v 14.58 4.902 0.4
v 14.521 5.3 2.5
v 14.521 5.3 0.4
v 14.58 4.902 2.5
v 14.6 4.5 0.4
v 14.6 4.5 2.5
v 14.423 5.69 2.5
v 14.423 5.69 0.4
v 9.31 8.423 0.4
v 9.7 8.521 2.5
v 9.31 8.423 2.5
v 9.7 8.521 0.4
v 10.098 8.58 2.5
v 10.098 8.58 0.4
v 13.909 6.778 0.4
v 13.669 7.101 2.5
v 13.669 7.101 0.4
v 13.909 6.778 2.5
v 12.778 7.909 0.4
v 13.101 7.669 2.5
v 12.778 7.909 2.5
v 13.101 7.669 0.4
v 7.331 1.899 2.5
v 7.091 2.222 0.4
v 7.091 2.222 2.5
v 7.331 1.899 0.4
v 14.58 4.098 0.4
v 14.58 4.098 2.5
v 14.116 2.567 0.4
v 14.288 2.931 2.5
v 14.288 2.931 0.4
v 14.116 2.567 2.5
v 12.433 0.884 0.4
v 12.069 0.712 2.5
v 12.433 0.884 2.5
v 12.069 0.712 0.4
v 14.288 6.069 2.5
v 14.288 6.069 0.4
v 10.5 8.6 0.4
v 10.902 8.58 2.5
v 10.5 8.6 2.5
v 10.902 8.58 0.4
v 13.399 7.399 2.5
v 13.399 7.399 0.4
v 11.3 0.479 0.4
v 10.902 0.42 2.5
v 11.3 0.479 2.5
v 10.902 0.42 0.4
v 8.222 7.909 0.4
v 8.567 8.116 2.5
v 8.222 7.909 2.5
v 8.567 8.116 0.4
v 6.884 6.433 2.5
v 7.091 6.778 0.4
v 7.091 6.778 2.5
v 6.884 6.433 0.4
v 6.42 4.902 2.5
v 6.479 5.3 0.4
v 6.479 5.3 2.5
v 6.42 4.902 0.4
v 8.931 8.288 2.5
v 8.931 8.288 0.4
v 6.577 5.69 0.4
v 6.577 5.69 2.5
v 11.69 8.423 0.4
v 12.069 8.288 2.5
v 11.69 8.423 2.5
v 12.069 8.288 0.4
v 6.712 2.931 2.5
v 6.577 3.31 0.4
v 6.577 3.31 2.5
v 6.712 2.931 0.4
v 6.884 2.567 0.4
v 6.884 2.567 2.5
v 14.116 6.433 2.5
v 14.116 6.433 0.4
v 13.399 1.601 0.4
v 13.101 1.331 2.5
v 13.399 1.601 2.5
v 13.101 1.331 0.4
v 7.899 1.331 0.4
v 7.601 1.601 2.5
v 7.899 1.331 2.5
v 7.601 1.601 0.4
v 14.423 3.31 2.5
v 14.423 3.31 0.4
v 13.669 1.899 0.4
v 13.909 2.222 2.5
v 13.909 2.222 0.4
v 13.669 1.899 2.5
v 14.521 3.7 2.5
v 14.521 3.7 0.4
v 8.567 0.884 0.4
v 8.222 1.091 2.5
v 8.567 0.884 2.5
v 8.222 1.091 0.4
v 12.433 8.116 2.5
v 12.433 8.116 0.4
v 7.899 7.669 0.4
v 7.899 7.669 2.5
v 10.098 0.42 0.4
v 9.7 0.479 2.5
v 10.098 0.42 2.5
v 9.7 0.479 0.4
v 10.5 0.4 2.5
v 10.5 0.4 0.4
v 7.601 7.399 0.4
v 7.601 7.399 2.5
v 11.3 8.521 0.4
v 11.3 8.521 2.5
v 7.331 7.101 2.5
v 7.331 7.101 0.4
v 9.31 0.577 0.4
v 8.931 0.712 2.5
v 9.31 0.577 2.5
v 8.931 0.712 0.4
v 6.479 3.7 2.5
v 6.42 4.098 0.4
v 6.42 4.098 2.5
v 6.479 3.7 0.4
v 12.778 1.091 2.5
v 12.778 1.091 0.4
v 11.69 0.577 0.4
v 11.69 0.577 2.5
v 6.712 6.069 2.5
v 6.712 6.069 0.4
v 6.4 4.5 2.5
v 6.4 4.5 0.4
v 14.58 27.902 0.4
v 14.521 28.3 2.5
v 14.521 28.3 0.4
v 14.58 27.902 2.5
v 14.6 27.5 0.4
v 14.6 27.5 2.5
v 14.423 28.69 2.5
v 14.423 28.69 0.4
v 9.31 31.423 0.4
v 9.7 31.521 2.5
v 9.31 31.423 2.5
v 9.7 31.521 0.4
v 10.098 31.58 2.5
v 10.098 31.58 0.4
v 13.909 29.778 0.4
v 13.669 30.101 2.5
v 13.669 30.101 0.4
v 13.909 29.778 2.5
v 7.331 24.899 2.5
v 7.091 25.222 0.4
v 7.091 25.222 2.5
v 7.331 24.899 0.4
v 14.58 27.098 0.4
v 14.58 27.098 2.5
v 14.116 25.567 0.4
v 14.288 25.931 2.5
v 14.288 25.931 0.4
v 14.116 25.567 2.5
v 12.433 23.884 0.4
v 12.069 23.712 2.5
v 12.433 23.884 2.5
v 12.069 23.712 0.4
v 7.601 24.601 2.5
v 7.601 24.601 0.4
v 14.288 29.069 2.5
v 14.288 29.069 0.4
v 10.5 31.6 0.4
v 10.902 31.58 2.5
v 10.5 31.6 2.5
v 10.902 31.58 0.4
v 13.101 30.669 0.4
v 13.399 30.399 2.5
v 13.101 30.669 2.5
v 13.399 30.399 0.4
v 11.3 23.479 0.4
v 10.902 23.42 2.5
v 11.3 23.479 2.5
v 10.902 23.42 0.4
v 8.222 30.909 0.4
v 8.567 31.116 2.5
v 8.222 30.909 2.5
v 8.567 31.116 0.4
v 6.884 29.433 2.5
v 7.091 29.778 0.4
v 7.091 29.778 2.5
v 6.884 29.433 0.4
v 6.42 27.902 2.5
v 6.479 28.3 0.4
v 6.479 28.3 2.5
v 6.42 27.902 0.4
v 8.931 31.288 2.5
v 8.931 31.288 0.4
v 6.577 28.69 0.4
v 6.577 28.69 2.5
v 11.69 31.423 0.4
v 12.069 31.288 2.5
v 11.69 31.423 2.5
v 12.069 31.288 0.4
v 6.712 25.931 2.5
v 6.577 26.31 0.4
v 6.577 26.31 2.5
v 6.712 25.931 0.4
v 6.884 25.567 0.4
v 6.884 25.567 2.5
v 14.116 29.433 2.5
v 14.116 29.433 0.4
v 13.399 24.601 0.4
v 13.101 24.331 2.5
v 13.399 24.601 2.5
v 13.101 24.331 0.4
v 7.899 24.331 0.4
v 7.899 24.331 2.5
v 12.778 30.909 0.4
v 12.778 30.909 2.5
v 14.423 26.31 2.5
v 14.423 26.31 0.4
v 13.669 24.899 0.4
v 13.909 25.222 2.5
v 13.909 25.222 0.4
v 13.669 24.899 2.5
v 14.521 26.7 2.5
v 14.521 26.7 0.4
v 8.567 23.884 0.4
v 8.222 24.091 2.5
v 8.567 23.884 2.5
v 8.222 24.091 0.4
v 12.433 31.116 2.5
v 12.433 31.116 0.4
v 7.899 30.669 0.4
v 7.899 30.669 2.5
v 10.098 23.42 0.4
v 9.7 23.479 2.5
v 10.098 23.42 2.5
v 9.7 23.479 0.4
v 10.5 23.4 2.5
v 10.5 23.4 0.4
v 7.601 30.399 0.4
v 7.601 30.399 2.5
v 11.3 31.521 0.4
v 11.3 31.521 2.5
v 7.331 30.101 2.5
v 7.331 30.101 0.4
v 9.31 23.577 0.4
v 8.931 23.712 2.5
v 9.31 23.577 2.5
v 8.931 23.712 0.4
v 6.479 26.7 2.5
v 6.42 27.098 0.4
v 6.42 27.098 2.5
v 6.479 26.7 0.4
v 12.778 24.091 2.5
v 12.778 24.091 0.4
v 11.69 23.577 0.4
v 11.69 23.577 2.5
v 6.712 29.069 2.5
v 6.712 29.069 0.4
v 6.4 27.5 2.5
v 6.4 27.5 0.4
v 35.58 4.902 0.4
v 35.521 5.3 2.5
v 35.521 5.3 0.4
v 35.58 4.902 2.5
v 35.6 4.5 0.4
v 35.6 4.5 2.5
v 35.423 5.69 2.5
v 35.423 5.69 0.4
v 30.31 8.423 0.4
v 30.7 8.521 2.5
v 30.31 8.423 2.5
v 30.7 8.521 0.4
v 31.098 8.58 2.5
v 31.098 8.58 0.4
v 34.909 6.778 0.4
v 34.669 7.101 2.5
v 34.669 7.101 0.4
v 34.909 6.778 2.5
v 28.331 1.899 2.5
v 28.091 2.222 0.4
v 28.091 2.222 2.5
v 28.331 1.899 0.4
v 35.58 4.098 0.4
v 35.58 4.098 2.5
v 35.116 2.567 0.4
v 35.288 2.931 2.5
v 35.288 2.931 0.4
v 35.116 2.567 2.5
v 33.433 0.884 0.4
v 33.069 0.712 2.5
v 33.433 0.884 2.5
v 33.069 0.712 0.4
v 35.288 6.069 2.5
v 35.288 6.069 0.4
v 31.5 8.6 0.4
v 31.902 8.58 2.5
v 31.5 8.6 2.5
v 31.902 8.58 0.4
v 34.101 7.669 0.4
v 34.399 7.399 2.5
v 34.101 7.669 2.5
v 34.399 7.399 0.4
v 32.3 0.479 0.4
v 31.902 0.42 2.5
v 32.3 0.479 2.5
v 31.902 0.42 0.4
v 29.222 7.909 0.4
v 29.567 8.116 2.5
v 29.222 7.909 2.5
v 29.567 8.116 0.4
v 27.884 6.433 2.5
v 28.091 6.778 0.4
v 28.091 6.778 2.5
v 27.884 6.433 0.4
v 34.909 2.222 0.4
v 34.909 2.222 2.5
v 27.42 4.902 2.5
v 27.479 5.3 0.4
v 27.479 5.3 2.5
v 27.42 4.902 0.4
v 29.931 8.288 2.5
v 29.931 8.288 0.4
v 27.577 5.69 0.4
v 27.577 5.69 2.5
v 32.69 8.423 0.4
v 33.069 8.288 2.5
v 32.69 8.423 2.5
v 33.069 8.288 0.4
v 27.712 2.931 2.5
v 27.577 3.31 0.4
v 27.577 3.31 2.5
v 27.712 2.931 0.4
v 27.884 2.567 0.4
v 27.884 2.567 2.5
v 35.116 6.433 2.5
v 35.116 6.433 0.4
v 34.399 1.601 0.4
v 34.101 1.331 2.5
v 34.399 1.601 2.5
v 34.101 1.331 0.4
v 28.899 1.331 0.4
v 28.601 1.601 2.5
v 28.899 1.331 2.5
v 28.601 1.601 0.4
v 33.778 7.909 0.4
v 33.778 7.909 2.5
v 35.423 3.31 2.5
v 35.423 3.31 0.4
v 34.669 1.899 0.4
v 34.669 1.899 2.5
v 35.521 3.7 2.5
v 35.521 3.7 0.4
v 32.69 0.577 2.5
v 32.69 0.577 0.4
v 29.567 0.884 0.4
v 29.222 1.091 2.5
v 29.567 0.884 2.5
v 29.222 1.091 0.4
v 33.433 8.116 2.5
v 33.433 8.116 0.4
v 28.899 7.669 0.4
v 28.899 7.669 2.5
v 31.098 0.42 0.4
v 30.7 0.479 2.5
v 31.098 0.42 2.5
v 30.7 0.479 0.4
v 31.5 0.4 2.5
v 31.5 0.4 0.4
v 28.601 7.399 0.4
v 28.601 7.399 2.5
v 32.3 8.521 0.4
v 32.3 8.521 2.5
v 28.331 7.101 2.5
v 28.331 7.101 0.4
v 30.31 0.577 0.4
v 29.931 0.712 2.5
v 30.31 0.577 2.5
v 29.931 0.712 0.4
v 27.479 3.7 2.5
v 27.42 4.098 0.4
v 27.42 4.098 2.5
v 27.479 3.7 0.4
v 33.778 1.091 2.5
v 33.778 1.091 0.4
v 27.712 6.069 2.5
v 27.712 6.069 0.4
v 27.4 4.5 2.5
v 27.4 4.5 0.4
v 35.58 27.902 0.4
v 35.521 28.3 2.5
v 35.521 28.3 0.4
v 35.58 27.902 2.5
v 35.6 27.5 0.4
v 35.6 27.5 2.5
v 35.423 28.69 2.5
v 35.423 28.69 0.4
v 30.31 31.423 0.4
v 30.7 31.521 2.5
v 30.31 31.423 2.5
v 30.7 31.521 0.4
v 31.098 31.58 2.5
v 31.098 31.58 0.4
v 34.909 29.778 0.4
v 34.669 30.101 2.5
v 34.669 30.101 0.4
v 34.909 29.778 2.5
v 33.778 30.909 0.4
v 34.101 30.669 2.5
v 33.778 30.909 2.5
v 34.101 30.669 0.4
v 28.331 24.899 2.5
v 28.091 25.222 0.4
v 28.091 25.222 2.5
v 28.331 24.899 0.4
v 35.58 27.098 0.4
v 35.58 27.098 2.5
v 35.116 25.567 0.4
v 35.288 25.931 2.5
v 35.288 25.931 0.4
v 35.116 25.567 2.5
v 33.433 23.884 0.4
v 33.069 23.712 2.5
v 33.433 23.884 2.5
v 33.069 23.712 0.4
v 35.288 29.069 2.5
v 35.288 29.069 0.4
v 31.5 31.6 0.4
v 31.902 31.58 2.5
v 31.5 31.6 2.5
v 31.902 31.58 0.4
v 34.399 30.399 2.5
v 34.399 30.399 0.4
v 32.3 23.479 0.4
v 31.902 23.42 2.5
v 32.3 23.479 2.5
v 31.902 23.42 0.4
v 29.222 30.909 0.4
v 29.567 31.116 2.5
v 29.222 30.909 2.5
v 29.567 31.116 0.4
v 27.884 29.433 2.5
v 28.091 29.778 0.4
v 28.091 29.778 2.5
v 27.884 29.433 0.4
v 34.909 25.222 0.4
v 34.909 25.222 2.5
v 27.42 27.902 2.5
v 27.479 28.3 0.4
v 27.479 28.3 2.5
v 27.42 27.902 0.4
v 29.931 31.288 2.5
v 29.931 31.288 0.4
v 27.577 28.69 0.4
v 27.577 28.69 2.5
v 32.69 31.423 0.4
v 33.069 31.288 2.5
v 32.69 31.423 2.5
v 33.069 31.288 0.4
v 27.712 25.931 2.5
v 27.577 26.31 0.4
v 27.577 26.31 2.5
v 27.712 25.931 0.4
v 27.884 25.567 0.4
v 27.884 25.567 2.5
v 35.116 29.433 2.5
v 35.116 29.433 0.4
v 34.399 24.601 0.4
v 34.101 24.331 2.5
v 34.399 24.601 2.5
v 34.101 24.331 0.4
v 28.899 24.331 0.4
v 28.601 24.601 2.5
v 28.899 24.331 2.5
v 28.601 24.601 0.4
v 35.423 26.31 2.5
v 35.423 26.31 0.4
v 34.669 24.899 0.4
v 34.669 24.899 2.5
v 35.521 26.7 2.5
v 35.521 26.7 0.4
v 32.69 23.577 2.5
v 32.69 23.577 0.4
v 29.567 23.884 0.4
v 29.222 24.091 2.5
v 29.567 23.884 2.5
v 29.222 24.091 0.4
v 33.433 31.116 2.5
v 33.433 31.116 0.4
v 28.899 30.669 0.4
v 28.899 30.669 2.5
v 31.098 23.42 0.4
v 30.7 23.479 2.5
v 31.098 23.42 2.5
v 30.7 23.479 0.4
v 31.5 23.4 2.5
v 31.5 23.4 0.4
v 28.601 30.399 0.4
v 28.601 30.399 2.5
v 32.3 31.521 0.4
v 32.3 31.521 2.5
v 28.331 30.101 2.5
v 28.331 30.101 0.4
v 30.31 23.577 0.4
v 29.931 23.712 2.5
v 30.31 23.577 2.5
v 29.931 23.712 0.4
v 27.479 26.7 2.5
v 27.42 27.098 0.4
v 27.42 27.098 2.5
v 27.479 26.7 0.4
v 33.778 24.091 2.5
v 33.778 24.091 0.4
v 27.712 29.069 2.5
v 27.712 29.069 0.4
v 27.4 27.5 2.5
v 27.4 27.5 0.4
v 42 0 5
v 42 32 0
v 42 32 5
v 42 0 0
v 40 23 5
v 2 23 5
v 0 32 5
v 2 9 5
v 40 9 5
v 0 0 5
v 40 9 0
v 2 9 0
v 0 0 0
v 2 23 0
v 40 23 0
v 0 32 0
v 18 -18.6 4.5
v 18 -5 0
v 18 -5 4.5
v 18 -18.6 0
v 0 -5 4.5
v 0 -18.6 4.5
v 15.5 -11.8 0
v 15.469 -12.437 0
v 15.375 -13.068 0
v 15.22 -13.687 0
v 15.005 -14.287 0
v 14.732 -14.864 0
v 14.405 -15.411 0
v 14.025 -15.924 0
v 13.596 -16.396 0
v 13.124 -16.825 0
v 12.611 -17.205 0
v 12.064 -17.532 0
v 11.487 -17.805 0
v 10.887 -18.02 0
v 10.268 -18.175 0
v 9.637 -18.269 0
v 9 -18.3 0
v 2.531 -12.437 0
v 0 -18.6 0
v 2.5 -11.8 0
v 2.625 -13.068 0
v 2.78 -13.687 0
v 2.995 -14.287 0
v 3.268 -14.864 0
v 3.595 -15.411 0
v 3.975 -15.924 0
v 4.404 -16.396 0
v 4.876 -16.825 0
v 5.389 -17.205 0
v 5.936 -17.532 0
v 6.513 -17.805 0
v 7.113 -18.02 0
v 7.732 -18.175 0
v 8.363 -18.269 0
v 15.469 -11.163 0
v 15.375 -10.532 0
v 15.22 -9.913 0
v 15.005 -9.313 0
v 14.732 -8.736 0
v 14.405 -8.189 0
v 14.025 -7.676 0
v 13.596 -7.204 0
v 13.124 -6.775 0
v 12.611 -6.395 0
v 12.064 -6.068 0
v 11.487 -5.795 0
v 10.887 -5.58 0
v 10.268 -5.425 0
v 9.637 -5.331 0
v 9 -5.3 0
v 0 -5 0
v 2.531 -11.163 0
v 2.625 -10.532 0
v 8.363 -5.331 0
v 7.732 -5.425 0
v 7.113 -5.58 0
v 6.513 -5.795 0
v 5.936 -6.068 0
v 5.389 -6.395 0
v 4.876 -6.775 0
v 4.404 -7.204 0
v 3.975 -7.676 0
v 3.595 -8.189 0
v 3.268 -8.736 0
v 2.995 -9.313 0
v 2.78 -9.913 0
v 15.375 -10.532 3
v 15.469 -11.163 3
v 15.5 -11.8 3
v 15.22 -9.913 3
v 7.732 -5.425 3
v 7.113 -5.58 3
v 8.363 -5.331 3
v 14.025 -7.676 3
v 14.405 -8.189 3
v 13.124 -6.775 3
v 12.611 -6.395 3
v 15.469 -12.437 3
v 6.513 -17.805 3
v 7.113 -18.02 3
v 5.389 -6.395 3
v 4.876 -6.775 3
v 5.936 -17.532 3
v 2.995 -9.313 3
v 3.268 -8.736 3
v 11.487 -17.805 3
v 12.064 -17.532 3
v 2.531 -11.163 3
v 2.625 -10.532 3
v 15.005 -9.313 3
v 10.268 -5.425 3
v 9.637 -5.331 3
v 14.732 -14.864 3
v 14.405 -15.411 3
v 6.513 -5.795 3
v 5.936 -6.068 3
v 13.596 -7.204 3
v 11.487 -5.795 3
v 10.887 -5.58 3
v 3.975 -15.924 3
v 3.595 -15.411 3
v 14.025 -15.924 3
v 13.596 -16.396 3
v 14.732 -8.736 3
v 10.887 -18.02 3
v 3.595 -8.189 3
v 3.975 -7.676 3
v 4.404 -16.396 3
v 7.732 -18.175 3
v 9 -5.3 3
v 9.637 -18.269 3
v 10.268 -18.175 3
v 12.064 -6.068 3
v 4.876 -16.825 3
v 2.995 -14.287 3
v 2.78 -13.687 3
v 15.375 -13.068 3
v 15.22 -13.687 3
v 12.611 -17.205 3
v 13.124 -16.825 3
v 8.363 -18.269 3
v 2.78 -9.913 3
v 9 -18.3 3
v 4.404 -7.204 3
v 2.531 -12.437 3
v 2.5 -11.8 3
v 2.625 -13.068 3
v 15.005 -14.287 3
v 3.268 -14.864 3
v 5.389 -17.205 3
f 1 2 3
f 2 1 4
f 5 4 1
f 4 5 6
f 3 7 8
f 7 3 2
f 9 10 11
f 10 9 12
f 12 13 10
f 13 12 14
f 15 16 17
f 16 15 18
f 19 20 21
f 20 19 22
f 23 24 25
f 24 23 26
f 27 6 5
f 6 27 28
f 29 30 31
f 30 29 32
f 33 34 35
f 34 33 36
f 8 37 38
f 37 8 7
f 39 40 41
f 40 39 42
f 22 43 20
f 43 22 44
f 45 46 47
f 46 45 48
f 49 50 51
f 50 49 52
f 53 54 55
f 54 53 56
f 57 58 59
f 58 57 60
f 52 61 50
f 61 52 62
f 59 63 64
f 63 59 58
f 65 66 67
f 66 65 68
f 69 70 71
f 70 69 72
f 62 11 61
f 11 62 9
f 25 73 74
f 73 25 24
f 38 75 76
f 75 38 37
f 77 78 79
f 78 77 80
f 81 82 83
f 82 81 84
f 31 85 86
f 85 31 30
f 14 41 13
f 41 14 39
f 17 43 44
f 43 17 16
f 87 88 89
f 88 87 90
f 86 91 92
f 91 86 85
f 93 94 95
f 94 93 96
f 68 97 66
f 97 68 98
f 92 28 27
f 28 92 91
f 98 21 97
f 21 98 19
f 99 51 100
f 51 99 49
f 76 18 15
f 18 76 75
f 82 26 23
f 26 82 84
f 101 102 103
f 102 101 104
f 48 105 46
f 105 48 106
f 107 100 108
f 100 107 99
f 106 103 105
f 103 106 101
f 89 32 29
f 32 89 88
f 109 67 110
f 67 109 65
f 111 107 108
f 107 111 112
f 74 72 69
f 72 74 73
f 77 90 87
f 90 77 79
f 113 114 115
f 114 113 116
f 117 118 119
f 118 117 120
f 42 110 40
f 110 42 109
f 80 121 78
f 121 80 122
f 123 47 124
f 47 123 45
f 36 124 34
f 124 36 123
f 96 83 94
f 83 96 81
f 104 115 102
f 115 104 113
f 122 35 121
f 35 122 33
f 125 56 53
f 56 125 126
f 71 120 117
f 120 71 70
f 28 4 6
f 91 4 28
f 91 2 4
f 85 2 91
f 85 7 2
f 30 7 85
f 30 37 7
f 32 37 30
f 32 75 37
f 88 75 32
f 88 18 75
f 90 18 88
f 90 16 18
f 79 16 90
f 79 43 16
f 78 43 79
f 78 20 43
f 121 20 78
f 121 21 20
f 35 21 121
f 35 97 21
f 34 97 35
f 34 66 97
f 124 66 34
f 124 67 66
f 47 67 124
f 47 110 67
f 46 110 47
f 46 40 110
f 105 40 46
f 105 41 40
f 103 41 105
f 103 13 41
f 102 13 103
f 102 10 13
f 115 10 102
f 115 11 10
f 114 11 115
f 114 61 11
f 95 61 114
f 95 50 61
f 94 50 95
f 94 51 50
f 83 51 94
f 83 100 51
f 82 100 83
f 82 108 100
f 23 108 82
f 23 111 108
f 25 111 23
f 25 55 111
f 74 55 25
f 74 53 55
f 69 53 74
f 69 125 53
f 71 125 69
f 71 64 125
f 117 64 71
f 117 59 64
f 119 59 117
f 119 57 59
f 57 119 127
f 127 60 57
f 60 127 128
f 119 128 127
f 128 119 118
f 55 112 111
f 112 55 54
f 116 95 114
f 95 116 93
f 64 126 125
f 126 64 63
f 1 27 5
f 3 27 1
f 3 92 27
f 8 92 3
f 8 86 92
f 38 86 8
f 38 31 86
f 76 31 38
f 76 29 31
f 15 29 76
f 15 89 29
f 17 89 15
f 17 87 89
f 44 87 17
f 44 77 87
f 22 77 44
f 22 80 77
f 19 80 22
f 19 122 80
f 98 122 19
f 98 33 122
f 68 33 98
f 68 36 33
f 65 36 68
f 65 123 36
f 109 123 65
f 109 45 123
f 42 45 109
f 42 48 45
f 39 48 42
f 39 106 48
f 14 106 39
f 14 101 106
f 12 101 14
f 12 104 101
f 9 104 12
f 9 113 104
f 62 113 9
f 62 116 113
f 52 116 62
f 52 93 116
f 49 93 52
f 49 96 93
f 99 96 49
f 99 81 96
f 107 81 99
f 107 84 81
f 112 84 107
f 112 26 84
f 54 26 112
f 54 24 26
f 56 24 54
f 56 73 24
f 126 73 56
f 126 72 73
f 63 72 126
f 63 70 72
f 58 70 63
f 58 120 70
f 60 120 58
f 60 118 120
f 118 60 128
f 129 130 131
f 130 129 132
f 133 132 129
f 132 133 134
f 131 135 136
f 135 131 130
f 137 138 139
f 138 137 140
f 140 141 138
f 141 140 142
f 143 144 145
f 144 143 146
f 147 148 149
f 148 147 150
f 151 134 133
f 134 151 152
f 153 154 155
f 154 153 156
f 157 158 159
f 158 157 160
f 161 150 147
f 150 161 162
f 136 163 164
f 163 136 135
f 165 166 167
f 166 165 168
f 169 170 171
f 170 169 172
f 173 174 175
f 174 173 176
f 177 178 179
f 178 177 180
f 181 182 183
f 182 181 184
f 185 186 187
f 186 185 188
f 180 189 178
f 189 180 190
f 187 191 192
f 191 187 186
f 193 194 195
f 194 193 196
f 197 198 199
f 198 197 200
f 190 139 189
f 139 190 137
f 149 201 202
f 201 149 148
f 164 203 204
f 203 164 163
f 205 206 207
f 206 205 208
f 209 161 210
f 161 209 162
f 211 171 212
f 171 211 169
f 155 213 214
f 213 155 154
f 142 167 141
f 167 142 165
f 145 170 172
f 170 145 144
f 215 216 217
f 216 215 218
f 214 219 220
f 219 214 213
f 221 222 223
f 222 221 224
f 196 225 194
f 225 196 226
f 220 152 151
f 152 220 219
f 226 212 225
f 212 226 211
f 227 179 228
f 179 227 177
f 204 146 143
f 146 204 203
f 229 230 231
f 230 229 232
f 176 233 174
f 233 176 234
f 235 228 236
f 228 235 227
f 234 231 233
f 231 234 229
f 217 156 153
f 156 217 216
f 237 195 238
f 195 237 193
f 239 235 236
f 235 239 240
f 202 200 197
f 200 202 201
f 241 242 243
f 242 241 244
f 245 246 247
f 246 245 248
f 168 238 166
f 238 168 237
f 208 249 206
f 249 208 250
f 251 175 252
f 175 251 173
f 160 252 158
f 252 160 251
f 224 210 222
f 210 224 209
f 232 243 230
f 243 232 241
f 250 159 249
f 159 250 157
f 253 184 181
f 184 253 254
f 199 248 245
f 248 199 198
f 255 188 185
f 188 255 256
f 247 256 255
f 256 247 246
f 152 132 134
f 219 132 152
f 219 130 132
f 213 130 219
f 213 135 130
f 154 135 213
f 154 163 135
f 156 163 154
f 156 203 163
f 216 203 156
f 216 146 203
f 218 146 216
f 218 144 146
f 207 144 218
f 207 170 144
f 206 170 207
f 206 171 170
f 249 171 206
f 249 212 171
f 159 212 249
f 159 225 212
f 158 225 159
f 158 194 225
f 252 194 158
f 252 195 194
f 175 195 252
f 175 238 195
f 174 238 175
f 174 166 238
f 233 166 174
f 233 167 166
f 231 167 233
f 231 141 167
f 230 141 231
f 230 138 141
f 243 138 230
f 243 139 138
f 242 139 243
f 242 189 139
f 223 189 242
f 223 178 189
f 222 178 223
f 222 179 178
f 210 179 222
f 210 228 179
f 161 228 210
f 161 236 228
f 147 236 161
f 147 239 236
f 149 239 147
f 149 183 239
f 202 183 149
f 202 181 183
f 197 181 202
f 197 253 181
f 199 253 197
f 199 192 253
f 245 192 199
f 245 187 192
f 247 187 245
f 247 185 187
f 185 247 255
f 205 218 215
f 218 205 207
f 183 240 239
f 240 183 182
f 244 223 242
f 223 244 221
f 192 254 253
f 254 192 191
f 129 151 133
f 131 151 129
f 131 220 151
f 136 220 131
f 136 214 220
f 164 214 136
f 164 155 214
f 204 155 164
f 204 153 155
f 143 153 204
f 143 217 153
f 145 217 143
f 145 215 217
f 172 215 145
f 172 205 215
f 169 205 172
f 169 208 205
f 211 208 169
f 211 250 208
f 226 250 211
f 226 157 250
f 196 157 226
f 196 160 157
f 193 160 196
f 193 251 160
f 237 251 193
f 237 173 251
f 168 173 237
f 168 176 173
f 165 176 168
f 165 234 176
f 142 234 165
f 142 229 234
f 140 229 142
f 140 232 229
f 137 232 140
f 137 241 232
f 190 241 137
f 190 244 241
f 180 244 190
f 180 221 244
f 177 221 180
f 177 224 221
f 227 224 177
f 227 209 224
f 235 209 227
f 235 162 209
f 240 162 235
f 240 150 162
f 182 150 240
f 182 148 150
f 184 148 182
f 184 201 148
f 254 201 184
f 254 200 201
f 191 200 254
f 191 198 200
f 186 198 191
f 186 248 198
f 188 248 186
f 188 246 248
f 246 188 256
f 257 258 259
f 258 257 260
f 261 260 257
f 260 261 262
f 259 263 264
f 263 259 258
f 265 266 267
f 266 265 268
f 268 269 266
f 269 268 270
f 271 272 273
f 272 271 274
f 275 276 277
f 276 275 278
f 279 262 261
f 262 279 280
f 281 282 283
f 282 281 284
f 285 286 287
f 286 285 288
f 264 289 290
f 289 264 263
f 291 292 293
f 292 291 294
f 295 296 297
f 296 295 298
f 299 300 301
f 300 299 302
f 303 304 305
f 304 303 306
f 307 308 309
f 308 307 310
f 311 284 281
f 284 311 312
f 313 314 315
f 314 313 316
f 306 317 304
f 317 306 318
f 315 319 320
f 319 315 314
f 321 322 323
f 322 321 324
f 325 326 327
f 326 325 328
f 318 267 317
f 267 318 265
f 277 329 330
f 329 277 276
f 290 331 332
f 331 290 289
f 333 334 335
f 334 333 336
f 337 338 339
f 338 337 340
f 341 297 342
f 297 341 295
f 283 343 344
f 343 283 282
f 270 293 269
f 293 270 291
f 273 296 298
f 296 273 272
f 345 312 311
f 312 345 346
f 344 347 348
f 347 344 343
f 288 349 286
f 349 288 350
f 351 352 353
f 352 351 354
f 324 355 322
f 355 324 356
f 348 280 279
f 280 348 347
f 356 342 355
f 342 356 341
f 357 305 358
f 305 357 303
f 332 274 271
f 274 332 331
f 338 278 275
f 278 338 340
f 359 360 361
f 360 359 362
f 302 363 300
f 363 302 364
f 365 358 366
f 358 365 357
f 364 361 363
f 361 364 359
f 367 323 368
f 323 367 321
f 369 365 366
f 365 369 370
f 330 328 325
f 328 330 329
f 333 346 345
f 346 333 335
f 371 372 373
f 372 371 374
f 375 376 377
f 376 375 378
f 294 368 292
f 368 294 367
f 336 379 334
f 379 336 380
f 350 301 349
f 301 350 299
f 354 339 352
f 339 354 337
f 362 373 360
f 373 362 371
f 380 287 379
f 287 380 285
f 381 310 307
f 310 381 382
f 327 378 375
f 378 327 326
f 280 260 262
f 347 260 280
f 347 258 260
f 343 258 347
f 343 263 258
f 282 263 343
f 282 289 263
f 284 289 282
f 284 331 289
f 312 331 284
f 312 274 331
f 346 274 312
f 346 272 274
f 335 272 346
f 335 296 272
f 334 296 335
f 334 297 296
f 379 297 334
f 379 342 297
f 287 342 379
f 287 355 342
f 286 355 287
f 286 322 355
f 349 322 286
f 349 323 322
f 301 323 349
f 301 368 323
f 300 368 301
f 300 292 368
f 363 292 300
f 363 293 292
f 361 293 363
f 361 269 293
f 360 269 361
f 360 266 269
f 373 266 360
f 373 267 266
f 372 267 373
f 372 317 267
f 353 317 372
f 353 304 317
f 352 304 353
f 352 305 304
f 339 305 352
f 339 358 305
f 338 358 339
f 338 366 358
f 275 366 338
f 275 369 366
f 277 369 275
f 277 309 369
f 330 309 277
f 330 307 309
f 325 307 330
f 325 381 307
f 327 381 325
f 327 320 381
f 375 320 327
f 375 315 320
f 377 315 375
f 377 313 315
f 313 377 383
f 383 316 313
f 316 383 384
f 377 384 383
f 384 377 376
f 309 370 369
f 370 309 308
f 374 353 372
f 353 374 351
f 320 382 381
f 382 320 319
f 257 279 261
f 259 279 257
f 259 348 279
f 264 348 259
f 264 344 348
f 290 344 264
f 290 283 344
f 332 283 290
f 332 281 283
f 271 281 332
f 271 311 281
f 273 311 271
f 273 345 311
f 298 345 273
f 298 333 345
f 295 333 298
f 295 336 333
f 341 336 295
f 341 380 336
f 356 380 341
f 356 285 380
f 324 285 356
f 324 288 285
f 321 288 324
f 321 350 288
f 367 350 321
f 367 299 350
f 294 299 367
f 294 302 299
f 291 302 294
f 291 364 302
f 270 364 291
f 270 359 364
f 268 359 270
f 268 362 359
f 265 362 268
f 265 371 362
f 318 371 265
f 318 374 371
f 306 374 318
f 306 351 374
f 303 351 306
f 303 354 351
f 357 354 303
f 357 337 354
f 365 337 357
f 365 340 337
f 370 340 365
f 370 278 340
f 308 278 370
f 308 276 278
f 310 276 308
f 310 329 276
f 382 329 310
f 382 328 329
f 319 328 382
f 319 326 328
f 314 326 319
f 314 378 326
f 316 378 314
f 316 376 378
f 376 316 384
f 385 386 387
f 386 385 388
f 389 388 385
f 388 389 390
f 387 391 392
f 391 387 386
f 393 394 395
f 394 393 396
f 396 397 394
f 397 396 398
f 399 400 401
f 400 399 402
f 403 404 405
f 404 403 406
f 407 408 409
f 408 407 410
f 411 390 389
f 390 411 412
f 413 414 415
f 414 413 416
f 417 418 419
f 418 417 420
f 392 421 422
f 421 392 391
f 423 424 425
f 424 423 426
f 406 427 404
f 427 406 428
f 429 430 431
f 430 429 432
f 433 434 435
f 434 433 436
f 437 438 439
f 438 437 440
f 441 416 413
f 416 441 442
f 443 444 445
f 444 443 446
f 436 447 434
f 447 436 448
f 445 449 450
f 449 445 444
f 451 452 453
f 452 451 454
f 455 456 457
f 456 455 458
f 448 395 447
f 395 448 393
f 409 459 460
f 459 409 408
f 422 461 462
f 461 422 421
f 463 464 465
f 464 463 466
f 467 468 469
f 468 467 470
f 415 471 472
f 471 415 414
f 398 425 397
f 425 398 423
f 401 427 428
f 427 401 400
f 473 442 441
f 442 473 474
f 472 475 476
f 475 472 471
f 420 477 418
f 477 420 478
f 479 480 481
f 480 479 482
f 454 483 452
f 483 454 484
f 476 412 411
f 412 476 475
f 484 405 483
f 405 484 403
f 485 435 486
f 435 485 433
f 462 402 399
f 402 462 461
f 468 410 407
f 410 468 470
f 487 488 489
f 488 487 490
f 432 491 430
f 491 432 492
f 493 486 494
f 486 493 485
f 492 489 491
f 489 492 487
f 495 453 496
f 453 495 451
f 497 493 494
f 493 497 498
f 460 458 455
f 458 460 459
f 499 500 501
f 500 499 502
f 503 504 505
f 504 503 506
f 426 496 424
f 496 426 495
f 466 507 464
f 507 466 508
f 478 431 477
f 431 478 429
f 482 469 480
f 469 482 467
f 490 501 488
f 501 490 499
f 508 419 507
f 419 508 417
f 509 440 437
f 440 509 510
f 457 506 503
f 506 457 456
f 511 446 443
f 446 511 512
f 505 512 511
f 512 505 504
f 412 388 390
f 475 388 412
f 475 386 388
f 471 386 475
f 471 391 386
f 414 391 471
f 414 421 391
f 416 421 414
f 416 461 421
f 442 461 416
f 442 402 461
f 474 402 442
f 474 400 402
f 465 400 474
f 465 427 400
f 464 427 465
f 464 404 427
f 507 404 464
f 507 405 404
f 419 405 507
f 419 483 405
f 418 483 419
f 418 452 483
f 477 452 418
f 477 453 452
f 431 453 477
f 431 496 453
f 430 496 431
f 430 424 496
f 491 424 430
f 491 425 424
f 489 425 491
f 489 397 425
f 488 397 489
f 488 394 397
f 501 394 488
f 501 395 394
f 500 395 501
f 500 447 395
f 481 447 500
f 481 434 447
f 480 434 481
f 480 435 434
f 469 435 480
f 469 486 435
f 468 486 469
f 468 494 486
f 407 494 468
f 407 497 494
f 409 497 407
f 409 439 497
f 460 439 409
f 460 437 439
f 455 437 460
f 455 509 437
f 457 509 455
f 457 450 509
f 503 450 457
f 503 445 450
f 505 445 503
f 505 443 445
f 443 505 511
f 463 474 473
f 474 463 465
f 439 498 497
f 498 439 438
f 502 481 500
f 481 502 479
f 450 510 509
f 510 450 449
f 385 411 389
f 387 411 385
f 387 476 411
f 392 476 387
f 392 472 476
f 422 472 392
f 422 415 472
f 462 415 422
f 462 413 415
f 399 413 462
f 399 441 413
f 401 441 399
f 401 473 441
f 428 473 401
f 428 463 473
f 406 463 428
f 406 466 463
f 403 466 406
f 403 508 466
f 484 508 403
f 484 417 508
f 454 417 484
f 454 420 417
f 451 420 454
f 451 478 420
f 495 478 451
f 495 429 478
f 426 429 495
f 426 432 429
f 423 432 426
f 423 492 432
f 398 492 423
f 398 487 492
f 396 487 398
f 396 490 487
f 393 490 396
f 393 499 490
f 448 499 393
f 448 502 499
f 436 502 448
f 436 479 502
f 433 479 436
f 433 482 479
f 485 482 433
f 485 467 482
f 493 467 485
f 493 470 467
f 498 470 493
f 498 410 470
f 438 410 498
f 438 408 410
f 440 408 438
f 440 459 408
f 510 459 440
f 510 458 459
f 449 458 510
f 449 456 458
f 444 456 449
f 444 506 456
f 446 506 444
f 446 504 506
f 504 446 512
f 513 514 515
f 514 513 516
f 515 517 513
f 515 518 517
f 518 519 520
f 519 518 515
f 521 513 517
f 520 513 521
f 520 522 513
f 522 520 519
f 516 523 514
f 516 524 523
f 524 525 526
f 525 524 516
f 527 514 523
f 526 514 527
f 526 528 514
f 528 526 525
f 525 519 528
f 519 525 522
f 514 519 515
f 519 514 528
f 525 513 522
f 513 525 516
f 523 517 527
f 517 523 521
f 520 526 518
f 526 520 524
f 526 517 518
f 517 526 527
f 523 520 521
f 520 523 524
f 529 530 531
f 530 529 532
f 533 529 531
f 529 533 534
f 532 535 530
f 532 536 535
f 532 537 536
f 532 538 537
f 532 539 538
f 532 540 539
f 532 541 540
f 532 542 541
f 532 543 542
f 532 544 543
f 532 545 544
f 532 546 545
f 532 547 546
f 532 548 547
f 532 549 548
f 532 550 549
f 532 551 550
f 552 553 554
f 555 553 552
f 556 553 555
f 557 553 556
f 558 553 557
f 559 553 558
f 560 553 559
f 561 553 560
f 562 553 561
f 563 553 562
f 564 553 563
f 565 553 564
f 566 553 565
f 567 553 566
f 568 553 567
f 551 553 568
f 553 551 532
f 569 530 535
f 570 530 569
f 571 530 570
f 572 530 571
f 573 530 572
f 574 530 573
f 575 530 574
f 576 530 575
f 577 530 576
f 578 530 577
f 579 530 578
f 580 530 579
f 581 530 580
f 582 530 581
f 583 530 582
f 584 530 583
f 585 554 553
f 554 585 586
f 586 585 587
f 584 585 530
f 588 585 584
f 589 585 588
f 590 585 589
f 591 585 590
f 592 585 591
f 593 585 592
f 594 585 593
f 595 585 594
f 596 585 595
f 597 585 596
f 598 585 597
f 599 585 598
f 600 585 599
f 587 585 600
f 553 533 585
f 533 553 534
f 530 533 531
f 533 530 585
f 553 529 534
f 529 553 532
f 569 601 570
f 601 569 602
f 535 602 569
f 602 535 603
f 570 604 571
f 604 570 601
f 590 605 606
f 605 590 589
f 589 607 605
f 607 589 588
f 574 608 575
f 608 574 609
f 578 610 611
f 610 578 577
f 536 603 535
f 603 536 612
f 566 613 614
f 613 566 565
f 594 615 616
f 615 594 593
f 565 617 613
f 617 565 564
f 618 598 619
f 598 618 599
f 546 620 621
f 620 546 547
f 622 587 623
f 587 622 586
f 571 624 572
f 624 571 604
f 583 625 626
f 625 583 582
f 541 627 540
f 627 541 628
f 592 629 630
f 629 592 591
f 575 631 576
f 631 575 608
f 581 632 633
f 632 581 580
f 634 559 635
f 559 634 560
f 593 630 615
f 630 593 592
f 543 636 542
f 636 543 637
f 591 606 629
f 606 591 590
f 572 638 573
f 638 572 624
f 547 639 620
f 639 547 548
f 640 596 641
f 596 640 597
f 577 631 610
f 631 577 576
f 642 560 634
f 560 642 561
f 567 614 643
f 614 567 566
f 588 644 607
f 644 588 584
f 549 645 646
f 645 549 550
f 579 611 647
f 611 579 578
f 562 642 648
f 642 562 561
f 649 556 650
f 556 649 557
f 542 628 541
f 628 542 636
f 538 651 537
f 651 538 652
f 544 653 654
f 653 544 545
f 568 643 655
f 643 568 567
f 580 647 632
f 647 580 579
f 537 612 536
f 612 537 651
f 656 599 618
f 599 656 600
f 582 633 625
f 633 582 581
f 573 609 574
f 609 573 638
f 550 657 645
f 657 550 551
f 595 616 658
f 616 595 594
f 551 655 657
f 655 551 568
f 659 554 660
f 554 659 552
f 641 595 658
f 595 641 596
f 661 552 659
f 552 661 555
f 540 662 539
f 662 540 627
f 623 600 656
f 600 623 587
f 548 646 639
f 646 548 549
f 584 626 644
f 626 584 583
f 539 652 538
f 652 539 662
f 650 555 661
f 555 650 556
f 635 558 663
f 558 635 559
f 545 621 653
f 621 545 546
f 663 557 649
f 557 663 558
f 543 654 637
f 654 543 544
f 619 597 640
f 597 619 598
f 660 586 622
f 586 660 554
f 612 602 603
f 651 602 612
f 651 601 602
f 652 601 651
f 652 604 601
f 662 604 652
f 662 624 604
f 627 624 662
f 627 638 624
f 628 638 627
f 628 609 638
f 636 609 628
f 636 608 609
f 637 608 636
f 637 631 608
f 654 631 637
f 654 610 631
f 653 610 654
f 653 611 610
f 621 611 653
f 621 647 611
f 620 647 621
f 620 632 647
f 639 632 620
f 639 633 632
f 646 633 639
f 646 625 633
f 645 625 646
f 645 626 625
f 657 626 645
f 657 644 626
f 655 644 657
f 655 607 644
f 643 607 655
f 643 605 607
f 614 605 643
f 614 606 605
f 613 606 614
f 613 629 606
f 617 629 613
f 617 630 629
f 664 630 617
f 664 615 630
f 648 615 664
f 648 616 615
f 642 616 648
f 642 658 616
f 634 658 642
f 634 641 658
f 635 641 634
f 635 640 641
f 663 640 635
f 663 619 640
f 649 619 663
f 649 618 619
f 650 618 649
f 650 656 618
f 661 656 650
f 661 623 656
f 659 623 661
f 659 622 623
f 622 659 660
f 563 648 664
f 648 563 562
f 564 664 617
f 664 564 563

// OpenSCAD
// Dishwasher button safety cover
// Two parts: frame (magnets) + sliding cover
// Print orientation: panel face UP (Z=0 at top)

// --- Button geometry ---
button_diameter   = 12;    // mm, button face diameter
button_protrusion = 2;     // mm, how far button sticks out from panel
cover_clearance   = 3;     // mm, internal cavity depth (clears button + margin)

// --- Frame geometry ---
bar_height        = 9;     // mm, top and bottom bar height (fits 8mm magnet + 0.5mm walls)
interior_height   = 14;    // mm, interior channel height
travel_distance   = 20;    // mm, how far cover slides left to expose button
cover_width       = 18;    // mm, width of sliding cover
interior_width    = cover_width + travel_distance;  // 38mm
frame_depth       = 5;     // mm, total depth from panel (Z)
wall_thickness    = 1.5;   // mm, cover front-face wall

// --- Magnets (8mm dia x 2mm thick neodymium, x4) ---
magnet_diameter   = 8;     // mm
magnet_height     = 2;     // mm
magnet_skin       = 0.4;   // mm, plastic skin on panel side over magnet

// --- Frame wall ---
frame_wall        = 2;     // mm, left and right wall thickness (also = right stopper thickness)

// --- Tolerances ---
slide_tolerance   = 0.2;   // mm clearance per side in Y (height axis) for smooth sliding

// --- Render ---
render_part = "both"; // "frame", "cover", "both"

// --- Derived (do not edit) ---
frame_w    = interior_width + frame_wall * 2;            // 42mm
frame_h    = bar_height * 2 + interior_height;          // 32mm
cover_h    = interior_height - slide_tolerance * 2;     // 13.6mm
cover_depth = cover_clearance + wall_thickness;         // 4.5mm

epsilon = 0.01;
$fn = 64;

// --- Render switch ---
if (render_part == "frame" || render_part == "both") {
    frame();
}
if (render_part == "cover" || render_part == "both") {
    translate([0, -(cover_h + 5), 0])
        cover();
}

module frame() {
    // X centres for magnet pockets (1/4 and 3/4 of frame width)
    magnet_x1 = frame_w * 0.25;  // 10.5mm
    magnet_x2 = frame_w * 0.75;  // 31.5mm
    // Y centres: middle of each bar
    bottom_bar_cy = bar_height / 2;                                    // 4.5mm
    top_bar_cy    = bar_height + interior_height + bar_height / 2;     // 27.5mm

    difference() {
        // Outer solid block
        cube([frame_w, frame_h, frame_depth]);

        // Interior channel — starts at left wall inner face; cover slides in from left
        translate([frame_wall, bar_height, -epsilon])
            cube([interior_width, interior_height, frame_depth + epsilon * 2]);

        // Magnet pockets — open from Z=0 (panel face), with magnet_skin cap
        // Pocket spans Z=magnet_skin to Z=magnet_skin+magnet_height
        // Slicer pause at z_print=4.6mm from bed (= frame_depth - magnet_skin)
        for (bx = [magnet_x1, magnet_x2]) {
            for (by = [bottom_bar_cy, top_bar_cy]) {
                translate([bx, by, magnet_skin])
                    cylinder(d = magnet_diameter + 0.2, h = magnet_height + 0.1);
            }
        }
    }
}
module cover() {
    difference() {
        // Cover body
        cube([cover_width, cover_h, cover_depth]);

        // Button clearance cavity on panel face (Z=0)
        // Circular recess: 1mm margin around 12mm button → 13mm diameter, 3mm deep
        translate([cover_width / 2, cover_h / 2, -epsilon])
            cylinder(d = button_diameter + 1, h = cover_clearance + epsilon);
    }
}
